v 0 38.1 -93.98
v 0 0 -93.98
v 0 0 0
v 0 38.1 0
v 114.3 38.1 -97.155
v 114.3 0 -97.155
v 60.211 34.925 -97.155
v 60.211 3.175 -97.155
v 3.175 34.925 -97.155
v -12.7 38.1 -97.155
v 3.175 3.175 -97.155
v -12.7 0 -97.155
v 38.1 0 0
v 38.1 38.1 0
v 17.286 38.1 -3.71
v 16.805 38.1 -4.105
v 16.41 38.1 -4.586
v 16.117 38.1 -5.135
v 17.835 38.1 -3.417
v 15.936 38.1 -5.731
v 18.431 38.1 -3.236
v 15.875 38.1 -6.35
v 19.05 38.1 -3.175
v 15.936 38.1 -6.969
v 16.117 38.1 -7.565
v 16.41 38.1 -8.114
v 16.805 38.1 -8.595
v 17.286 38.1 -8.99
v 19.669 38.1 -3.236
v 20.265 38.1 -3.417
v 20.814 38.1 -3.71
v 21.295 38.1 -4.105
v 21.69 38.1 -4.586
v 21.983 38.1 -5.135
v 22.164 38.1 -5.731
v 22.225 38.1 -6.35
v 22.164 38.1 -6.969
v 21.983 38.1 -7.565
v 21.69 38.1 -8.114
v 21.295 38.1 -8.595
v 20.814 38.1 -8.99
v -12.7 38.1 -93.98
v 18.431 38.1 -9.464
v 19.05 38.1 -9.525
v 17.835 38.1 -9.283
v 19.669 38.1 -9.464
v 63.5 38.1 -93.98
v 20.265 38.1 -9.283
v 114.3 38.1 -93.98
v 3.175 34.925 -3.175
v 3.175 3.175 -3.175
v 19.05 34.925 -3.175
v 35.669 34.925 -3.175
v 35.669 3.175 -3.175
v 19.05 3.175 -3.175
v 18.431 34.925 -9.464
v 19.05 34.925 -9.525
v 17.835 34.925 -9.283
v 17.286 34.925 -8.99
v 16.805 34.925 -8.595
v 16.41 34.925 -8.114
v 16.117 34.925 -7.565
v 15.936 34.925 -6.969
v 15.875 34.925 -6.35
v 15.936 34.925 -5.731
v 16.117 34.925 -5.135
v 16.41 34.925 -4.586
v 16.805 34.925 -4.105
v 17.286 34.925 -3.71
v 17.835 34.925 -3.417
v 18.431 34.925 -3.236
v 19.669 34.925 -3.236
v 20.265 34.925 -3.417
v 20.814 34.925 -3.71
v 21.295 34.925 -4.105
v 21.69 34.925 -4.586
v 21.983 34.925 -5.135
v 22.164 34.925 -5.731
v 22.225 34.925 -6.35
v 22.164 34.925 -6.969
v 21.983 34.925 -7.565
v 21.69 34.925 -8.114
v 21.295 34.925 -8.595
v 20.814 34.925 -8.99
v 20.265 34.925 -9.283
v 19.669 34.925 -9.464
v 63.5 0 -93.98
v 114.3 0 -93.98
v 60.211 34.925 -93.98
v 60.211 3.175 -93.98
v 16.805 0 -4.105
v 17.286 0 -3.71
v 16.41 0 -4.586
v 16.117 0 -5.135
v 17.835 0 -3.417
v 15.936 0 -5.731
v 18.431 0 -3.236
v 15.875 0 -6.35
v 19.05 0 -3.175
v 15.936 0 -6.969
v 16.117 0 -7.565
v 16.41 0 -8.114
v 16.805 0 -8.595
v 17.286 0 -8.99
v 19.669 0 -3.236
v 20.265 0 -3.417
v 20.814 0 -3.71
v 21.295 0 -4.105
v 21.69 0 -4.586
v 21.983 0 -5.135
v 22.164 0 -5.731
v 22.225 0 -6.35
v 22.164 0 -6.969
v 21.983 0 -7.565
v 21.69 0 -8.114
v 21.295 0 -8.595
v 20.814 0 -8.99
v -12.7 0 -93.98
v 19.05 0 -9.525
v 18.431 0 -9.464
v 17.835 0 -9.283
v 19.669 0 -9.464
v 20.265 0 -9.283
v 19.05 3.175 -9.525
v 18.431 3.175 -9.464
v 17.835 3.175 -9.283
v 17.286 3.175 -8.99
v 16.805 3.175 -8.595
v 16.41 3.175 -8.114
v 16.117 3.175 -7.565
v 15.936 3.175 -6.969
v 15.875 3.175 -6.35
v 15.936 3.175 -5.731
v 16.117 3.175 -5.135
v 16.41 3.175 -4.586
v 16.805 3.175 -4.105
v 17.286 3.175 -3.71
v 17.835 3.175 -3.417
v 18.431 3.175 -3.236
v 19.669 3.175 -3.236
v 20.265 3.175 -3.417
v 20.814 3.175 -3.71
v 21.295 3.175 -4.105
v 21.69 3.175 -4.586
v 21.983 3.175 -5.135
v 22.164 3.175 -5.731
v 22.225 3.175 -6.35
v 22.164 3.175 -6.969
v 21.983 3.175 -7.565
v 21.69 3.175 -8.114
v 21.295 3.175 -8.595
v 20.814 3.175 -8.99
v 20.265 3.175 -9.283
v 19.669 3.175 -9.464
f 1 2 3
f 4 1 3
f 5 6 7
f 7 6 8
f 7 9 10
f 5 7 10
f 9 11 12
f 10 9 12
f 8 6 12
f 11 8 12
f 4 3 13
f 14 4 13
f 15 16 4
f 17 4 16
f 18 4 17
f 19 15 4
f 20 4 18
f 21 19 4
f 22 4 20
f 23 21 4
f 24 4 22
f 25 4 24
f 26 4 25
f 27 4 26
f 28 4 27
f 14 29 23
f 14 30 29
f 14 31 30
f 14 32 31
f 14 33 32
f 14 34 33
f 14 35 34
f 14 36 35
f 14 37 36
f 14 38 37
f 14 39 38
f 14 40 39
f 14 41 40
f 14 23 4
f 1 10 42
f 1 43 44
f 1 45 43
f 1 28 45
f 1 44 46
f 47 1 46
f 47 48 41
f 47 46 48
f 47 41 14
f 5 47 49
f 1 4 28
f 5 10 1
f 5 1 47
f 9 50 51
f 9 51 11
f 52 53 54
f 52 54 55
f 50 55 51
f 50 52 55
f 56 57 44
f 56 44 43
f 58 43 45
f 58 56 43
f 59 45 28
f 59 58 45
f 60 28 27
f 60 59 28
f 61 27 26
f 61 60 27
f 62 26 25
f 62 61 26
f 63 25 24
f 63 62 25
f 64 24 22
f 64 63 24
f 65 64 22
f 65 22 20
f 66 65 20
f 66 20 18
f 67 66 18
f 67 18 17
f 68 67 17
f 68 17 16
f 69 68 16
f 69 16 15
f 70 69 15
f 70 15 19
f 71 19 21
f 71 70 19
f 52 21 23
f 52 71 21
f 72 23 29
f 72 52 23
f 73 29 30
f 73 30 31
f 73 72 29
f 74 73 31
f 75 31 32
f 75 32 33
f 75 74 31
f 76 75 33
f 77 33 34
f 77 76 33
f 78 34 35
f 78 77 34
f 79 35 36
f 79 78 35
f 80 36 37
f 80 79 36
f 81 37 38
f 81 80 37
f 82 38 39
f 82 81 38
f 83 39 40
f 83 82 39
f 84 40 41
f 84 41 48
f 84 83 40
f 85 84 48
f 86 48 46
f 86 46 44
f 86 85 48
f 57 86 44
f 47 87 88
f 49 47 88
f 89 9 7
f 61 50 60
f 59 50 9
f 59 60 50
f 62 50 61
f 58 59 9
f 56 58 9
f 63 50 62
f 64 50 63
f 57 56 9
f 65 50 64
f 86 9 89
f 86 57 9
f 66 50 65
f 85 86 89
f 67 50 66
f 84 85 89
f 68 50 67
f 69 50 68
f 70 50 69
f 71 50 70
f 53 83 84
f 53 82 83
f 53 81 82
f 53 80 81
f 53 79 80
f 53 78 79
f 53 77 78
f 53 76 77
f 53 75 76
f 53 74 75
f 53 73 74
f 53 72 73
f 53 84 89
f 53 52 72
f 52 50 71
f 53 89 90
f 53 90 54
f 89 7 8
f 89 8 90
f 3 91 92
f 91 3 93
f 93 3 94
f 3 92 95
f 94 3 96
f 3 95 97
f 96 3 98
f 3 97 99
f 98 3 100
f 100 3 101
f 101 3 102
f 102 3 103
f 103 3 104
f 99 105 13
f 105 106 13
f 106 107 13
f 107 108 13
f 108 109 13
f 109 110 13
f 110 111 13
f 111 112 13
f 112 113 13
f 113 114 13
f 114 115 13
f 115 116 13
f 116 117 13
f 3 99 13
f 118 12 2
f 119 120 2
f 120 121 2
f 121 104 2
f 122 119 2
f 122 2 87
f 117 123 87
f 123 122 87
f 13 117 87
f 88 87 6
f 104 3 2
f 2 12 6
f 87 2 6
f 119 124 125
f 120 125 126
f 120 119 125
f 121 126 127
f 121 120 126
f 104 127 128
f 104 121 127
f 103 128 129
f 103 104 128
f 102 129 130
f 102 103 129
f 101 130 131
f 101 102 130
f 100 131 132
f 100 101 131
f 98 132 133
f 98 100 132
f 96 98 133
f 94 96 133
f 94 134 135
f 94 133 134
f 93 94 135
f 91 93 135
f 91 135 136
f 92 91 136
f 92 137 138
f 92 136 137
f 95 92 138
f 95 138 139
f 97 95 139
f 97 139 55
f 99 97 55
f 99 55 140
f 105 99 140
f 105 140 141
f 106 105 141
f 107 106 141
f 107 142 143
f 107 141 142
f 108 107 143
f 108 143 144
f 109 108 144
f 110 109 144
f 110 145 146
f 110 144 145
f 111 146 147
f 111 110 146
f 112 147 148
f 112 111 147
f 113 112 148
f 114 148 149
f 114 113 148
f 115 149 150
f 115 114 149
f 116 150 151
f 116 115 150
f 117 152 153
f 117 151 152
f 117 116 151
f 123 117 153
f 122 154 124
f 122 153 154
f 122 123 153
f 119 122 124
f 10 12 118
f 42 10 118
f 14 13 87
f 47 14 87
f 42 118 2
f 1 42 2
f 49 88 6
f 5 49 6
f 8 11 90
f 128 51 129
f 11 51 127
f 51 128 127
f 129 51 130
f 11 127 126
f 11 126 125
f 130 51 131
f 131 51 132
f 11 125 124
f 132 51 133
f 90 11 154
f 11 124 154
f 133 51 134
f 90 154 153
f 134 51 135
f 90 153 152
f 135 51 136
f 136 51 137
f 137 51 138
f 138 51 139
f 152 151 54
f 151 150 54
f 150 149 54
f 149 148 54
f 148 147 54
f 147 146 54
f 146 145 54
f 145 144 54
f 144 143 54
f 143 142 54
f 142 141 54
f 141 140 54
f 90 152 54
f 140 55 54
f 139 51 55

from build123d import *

# Parameters (mm, degrees)
SKETCH1_R           = 3.175
BOSS_EXTRUDE1_DEPTH = 38.1
CUT_EXTRUDE1_START  = -34.925
CUT_EXTRUDE1_DEPTH  = 31.75


with BuildPart() as part:
    # Sketch1 → Boss-Extrude1 (new body)
    with BuildSketch(Plane(origin=(0, 0, 0), x_dir=(1, 0, 0), z_dir=(0, 1, 0))):
        Polygon((-12.7, 97.155), (-12.7, 93.98), (0, 93.98), (0, 0), (38.1, 0), (63.5, 93.98), (114.3, 93.98), (114.3, 97.155), align=None)
        with Locations(Location((19.05, 6.35, 0), (0, 0, 90))):
            Circle(SKETCH1_R, mode=Mode.SUBTRACT)
    extrude(amount=BOSS_EXTRUDE1_DEPTH)

    # Sketch2 → Cut-Extrude1 (cut)
    with BuildSketch(Plane.XZ.offset(CUT_EXTRUDE1_START)):
        Polygon((60.211083077, -97.155), (60.211083077, -93.98), (35.669191185, -3.175), (3.175, -3.175), (3.175, -93.98), (3.175, -97.155), align=None)
    extrude(amount=CUT_EXTRUDE1_DEPTH, mode=Mode.SUBTRACT)


solid = part.part
